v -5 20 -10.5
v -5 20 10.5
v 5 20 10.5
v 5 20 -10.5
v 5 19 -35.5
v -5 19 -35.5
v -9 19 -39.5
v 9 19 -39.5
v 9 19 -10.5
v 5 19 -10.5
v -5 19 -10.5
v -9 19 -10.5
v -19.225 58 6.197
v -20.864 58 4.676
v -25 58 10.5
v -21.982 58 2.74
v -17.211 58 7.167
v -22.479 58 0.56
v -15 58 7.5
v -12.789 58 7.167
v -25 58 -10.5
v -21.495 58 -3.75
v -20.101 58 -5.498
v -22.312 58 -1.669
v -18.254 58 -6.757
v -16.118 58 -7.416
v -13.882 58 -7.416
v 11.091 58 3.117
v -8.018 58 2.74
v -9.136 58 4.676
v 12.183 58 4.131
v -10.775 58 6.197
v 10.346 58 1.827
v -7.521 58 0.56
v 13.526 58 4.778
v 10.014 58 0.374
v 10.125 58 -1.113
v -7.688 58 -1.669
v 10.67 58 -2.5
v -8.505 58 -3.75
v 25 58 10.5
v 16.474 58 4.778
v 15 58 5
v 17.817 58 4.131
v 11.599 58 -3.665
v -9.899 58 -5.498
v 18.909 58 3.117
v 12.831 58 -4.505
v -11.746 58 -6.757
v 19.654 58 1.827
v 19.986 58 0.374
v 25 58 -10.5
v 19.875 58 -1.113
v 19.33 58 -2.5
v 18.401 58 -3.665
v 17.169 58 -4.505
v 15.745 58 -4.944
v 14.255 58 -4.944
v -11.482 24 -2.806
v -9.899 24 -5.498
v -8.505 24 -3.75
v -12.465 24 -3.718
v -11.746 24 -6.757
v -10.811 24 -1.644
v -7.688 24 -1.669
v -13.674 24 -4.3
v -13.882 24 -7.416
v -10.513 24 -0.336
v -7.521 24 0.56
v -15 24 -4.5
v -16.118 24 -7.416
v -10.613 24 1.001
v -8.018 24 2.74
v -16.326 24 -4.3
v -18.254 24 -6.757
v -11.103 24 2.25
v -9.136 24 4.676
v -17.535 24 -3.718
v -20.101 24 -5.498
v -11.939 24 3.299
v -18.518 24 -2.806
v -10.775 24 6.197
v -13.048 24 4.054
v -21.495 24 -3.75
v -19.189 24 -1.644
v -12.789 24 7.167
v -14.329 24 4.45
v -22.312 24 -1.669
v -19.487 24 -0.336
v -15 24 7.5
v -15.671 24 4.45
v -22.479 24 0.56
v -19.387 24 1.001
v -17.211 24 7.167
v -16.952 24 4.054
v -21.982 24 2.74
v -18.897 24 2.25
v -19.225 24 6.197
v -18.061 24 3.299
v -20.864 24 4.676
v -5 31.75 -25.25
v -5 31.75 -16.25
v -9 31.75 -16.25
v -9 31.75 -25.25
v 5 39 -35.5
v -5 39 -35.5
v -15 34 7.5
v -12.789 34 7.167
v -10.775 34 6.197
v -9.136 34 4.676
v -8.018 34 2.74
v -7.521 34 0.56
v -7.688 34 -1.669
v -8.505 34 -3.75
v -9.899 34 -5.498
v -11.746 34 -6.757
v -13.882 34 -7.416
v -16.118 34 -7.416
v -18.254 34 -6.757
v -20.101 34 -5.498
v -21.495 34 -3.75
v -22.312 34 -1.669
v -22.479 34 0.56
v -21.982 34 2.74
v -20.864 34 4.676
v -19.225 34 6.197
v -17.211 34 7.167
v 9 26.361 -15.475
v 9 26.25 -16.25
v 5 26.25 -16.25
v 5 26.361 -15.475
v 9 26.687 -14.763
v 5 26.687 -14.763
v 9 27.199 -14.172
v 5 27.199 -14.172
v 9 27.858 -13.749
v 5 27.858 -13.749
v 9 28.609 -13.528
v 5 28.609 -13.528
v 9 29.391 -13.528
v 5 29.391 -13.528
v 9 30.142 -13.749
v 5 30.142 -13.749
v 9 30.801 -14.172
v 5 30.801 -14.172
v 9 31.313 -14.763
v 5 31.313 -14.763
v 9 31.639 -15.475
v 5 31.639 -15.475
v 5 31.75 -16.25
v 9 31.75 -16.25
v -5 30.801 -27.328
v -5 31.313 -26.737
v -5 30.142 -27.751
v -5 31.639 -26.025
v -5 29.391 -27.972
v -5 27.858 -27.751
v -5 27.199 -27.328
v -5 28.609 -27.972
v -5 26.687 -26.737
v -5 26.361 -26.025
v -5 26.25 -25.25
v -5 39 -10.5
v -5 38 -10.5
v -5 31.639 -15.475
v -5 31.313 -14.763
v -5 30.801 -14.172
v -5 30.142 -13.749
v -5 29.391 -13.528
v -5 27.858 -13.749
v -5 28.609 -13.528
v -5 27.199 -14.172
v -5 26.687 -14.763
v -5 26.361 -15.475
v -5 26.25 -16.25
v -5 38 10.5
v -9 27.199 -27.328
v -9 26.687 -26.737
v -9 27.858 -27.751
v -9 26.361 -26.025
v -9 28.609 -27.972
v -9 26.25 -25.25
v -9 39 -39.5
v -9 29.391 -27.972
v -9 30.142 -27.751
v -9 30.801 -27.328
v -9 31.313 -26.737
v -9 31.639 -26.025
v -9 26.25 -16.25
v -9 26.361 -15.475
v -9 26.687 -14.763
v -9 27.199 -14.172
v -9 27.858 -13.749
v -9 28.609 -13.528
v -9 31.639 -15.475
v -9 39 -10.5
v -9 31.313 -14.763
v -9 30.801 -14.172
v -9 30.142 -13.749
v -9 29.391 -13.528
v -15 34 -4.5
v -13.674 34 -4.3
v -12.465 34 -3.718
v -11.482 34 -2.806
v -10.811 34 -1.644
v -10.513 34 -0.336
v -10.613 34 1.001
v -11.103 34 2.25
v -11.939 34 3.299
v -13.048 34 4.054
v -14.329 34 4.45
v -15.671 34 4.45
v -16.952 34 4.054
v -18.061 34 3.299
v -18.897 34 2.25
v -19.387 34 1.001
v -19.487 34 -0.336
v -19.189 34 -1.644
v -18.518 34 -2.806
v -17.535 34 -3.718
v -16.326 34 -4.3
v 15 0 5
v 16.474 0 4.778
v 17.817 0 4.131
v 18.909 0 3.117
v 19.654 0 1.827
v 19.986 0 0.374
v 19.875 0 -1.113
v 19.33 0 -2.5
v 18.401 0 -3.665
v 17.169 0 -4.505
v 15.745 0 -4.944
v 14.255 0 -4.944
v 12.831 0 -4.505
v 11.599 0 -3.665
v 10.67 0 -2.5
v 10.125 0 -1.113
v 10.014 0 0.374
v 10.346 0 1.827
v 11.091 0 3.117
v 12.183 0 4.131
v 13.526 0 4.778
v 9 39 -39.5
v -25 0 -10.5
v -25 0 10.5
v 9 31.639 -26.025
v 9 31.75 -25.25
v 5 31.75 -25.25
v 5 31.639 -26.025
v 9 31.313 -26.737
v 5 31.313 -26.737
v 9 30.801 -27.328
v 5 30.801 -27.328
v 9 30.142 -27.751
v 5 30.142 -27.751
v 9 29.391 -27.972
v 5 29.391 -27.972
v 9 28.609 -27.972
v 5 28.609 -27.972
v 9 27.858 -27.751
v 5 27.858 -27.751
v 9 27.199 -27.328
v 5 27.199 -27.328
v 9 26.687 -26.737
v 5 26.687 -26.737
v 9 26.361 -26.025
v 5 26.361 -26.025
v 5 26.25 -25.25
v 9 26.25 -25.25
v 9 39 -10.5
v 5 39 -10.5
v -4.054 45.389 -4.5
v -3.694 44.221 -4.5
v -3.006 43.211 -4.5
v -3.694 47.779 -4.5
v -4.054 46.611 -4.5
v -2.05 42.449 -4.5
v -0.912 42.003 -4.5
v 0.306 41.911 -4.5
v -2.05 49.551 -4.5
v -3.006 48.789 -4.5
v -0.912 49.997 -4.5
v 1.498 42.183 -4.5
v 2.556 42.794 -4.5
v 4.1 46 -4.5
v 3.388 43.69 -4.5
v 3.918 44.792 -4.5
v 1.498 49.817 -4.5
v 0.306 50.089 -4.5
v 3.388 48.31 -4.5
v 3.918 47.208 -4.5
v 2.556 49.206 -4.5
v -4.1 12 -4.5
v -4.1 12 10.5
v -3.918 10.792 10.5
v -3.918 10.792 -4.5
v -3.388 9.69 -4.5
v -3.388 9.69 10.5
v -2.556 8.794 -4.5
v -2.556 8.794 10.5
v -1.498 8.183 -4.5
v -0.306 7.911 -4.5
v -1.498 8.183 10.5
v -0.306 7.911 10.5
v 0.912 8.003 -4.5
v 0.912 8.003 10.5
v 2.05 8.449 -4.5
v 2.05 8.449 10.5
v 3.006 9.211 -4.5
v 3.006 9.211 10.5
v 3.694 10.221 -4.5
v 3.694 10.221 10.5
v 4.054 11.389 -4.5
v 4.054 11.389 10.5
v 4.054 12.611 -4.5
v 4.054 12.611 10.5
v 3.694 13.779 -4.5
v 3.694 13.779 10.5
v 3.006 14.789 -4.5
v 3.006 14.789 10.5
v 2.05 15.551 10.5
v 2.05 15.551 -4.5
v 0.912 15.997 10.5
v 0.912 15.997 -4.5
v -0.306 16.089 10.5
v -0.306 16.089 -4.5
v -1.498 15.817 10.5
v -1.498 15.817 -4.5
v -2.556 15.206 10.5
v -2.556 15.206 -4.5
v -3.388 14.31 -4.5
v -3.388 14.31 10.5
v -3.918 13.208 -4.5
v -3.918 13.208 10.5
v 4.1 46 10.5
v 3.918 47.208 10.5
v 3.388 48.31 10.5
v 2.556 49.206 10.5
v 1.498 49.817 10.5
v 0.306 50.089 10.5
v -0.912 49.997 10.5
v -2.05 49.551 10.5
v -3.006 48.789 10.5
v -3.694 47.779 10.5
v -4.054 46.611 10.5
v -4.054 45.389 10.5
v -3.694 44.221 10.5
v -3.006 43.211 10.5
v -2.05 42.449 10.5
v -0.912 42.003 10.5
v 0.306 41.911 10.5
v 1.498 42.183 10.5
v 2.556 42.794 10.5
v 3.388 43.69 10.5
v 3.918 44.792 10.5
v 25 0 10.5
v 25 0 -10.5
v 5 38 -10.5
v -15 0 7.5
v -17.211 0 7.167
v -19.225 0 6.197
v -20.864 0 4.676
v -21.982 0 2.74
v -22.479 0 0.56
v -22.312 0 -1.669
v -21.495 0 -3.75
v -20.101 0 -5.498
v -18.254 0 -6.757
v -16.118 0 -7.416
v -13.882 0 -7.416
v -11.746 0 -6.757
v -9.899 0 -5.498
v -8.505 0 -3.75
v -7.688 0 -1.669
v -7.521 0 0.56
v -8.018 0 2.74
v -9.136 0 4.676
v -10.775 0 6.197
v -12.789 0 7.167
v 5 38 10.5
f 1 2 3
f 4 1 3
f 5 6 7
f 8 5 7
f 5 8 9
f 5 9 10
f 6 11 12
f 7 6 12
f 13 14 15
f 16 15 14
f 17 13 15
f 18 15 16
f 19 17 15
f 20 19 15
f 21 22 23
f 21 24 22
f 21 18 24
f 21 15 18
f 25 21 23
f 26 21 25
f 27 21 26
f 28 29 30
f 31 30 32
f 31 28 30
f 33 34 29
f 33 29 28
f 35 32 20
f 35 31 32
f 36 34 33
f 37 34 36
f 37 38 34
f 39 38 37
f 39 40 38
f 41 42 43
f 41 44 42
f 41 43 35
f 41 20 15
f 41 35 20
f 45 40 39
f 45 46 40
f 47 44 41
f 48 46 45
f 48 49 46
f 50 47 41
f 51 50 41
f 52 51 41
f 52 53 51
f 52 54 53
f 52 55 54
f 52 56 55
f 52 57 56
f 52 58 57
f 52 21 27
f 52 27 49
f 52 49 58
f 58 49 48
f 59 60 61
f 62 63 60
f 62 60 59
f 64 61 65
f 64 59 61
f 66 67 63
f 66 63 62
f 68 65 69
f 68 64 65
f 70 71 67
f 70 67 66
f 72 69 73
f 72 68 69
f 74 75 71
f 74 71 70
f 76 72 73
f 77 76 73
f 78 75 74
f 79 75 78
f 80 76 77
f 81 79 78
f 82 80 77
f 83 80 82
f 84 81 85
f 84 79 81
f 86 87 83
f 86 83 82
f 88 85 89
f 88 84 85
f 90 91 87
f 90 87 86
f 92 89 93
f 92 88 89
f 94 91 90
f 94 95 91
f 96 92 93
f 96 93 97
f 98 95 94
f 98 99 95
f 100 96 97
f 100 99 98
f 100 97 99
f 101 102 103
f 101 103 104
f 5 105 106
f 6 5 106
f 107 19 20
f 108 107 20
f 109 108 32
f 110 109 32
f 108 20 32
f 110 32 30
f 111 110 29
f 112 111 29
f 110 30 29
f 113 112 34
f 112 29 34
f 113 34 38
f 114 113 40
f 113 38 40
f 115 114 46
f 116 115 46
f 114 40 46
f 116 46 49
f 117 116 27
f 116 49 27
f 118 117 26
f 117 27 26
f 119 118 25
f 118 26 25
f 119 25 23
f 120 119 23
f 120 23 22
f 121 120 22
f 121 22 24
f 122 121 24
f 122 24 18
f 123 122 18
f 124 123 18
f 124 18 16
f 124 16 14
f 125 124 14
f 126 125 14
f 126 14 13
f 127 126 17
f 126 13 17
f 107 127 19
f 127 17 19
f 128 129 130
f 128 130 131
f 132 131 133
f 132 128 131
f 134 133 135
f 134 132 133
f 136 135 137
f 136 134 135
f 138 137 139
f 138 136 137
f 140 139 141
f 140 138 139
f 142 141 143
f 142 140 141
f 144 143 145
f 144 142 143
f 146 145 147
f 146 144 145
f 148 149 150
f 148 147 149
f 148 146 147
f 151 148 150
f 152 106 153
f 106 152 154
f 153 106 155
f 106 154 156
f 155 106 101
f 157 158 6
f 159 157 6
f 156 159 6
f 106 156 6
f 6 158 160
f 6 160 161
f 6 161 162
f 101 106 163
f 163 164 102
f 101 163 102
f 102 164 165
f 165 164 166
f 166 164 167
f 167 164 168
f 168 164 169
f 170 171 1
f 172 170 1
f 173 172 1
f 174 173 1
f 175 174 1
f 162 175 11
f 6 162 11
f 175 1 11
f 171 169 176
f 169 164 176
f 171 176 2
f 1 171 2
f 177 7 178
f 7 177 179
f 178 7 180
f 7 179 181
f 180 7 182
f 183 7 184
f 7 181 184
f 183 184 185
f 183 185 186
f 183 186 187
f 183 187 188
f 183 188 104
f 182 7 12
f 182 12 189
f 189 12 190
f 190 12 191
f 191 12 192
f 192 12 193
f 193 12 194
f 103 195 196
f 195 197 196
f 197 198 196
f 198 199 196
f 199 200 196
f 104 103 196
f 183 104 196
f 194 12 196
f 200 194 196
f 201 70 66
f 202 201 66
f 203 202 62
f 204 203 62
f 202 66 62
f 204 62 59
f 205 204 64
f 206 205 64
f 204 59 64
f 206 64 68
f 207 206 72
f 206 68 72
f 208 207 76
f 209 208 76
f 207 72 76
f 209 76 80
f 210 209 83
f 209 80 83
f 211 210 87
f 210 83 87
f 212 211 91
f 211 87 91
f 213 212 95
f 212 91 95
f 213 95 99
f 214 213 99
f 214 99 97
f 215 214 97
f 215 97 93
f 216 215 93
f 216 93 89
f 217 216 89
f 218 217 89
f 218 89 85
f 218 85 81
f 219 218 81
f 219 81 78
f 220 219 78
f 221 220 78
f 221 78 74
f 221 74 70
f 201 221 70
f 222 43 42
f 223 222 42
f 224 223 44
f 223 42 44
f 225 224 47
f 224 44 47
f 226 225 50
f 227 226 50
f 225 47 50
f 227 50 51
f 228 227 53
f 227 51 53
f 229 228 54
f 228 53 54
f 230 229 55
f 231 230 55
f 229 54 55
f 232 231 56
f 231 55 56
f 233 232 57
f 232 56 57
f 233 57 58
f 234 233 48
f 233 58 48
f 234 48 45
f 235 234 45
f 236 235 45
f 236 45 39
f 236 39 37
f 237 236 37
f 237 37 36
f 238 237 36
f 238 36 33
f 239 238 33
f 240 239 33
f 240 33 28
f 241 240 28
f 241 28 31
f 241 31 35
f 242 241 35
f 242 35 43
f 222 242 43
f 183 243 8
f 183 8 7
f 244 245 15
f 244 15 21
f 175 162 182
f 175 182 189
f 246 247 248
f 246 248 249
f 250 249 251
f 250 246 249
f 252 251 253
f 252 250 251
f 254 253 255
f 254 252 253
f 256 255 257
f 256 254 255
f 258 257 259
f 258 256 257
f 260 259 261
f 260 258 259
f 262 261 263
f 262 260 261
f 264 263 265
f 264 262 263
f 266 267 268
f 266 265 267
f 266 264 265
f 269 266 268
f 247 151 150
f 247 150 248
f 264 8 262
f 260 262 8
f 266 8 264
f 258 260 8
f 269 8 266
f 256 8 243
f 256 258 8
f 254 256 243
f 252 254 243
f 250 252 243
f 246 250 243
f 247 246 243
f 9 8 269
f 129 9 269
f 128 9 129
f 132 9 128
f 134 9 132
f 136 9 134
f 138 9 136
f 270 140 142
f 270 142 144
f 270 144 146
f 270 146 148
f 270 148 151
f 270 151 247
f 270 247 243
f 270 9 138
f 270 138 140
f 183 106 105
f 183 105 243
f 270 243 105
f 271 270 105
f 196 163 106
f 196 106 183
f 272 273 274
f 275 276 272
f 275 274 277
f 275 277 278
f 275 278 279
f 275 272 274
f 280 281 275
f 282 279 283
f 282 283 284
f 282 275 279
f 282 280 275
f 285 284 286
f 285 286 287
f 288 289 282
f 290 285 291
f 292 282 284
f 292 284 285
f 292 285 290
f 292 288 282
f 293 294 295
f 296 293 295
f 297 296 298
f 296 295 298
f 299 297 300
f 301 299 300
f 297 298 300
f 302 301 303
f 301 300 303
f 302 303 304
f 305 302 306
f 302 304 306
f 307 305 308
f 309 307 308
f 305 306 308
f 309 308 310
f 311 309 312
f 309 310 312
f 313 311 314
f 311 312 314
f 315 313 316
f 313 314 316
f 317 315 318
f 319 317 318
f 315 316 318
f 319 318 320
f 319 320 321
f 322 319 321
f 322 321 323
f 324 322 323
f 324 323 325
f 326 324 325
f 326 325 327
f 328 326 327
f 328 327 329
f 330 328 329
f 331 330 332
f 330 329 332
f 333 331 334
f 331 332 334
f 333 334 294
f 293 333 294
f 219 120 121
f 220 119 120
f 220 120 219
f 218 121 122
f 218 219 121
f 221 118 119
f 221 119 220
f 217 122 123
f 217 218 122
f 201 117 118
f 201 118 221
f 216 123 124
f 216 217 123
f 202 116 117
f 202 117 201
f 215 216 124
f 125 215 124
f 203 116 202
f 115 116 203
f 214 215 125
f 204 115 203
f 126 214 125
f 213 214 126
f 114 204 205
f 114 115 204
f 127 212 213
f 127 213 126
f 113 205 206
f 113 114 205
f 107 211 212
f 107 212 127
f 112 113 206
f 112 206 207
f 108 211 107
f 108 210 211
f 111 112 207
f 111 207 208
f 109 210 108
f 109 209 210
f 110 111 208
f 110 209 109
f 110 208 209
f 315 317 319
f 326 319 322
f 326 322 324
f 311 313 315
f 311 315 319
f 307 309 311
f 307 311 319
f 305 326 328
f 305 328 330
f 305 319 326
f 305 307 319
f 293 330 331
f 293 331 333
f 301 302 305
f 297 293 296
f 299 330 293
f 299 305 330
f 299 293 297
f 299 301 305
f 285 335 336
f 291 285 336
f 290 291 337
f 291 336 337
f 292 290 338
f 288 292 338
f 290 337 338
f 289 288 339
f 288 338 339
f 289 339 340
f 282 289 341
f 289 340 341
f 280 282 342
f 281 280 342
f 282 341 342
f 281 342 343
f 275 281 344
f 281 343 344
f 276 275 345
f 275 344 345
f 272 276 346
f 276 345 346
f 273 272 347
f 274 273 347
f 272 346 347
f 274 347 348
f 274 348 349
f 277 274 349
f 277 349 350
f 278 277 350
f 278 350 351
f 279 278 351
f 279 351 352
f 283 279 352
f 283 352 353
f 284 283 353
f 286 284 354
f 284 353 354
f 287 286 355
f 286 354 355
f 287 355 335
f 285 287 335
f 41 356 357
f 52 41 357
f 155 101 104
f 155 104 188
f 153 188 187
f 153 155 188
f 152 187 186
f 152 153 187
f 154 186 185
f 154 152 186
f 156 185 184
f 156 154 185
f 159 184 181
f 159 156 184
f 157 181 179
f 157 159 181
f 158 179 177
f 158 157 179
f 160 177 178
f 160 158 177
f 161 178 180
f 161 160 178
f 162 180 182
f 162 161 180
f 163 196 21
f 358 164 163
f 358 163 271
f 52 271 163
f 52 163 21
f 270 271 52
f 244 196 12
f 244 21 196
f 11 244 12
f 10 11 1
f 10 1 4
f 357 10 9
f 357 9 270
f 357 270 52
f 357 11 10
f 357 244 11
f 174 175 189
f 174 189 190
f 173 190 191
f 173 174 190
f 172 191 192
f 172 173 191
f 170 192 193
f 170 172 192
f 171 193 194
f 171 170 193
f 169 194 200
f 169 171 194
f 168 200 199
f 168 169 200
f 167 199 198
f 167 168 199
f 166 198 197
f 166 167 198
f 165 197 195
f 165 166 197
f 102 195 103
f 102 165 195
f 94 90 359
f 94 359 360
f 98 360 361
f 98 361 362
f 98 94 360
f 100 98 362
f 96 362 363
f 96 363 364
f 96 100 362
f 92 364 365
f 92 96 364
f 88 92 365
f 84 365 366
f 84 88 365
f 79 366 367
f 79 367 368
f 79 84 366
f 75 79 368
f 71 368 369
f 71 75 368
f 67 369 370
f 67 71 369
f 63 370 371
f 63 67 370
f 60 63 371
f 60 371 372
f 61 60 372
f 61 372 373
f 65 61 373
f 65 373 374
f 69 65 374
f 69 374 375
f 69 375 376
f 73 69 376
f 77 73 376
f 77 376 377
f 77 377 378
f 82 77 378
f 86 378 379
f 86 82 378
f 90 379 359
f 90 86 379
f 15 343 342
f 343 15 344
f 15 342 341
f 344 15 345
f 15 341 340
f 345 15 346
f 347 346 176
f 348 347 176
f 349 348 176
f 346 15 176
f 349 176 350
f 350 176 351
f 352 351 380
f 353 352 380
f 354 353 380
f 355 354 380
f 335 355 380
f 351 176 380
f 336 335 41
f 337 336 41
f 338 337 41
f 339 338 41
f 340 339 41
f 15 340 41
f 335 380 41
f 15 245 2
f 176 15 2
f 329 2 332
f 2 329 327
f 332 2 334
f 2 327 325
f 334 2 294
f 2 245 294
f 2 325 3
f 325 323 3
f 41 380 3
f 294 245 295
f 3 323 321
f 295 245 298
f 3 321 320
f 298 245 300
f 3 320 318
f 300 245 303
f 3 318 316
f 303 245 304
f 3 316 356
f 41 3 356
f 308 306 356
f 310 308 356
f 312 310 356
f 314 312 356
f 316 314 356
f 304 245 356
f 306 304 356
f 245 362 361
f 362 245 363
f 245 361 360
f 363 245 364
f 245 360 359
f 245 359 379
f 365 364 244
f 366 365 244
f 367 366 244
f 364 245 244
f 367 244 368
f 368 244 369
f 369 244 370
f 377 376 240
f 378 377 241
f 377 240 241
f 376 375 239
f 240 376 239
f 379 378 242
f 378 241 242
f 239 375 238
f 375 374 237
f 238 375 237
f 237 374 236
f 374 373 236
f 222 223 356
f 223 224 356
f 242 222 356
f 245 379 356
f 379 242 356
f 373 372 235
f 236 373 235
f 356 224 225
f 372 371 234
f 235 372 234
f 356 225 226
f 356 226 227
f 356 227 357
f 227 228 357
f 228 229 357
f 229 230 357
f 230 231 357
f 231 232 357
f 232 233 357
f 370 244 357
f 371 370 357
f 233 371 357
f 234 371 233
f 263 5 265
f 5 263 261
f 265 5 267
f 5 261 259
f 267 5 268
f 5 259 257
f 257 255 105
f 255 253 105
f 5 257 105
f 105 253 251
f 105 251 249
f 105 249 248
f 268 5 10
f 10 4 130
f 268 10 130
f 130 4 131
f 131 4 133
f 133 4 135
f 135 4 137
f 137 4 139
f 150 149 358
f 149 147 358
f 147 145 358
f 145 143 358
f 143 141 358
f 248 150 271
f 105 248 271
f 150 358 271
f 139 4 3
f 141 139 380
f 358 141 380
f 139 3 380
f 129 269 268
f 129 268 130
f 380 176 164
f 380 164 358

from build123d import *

# Parameters (mm, degrees)
SKETCH1_W           = 50
SKETCH1_H           = 21
BOSS_EXTRUDE1_DEPTH = 58
SKETCH3_R           = 7.5
CUT_EXTRUDE1_DEPTH  = 24
CUT_EXTRUDE2_REACH  = 66.025
SKETCH4_R           = 5
CUT_EXTRUDE3_START  = -24
SKETCH5_R           = 7.5
CUT_EXTRUDE3_DEPTH  = 24
CUT_EXTRUDE4_REACH  = 66.025
SKETCH6_R           = 4.5
CUT_EXTRUDE5_REACH  = 68.558
SKETCH8_W           = 10
SKETCH8_H           = 18
SKETCH7_R           = 4.1
CUT_EXTRUDE6_DEPTH  = 15
BOSS_EXTRUDE2_DEPTH = 25
SKETCH12_W          = 18
SKETCH12_H          = 20
BOSS_EXTRUDE3_DEPTH = 4
CUT_EXTRUDE7_DEPTH  = 78.975957833


with BuildPart() as part:
    # Sketch1 → Boss-Extrude1 (new body)
    with BuildSketch(Plane(origin=(0, 0, 0), x_dir=(1, 0, 0), z_dir=(0, 1, 0))):
        Rectangle(SKETCH1_W, SKETCH1_H)
    extrude(amount=BOSS_EXTRUDE1_DEPTH)

    # Sketch3 → Cut-Extrude1 (cut)
    with BuildSketch(Plane(origin=(0, 58, 0), x_dir=(1, 0, 0), z_dir=(0, 1, 0))):
        with Locations(Location((-15, 0, 0), (0, 0, 270))):
            Circle(SKETCH3_R)
    extrude(amount=-CUT_EXTRUDE1_DEPTH, mode=Mode.SUBTRACT)

    # Sketch4 → Cut-Extrude2 (cut, up to next)
    with BuildSketch(Plane(origin=(0, 58, 0), x_dir=(1, 0, 0), z_dir=(0, 1, 0)), mode=Mode.PRIVATE) as cut_extrude2_sk1:
        with Locations(Location((15, 0, 0), (0, 0, 270))):
            Circle(SKETCH4_R)
    cut_extrude2_tool1 = extrude(cut_extrude2_sk1.sketch, amount=-CUT_EXTRUDE2_REACH, mode=Mode.PRIVATE) & part.part
    add(cut_extrude2_tool1.solids().sort_by_distance((15, 58, 0))[0], mode=Mode.SUBTRACT)

    # Sketch5 → Cut-Extrude3 (cut)
    with BuildSketch(Plane.XZ.offset(CUT_EXTRUDE3_START)):
        with Locations(Location((-15, 0, 0), (0, 0, 90))):
            Circle(SKETCH5_R)
    extrude(amount=CUT_EXTRUDE3_DEPTH, mode=Mode.SUBTRACT)

    # Sketch6 → Cut-Extrude4 (cut, up to next)
    with BuildSketch(Plane.XZ, mode=Mode.PRIVATE) as cut_extrude4_sk1:
        with Locations(Location((-15, 0, 0), (0, 0, 270))):
            Circle(SKETCH6_R)
    cut_extrude4_tool1 = extrude(cut_extrude4_sk1.sketch, amount=-CUT_EXTRUDE4_REACH, mode=Mode.PRIVATE) & part.part
    add(cut_extrude4_tool1.solids().sort_by_distance((-15, 0, 0))[0], mode=Mode.SUBTRACT)

    # Sketch8 → Cut-Extrude5 (cut, up to next)
    with BuildSketch(Plane.XY.offset(10.5), mode=Mode.PRIVATE) as cut_extrude5_sk1:
        with Locations((0, 29)):
            Rectangle(SKETCH8_W, SKETCH8_H)
    cut_extrude5_tool1 = extrude(cut_extrude5_sk1.sketch, amount=-CUT_EXTRUDE5_REACH, mode=Mode.PRIVATE) & part.part
    add(cut_extrude5_tool1.solids().sort_by_distance((0, 29, 10.5))[0], mode=Mode.SUBTRACT)

    # Sketch7 → Cut-Extrude6 (cut)
    with BuildSketch(Plane.XY.offset(10.5)):
        with Locations((0, 46)):
            Circle(SKETCH7_R)
        with Locations(Location((0, 12, 0), (0, 0, 180))):
            Circle(SKETCH7_R)
    extrude(amount=-CUT_EXTRUDE6_DEPTH, mode=Mode.SUBTRACT)

    # Sketch11 → Boss-Extrude2 (add)
    with BuildSketch(Plane(origin=(0, 0, -10.5), x_dir=(-1, 0, 0), z_dir=(0, 0, -1))):
        Polygon((9, 19), (9, 39), (5, 39), (5, 38), (5, 20), (5, 19), align=None)
        Polygon((-9, 39), (-9, 19), (-5, 19), (-5, 20), (-5, 38), (-5, 39), align=None)
    extrude(amount=BOSS_EXTRUDE2_DEPTH)

    # Sketch12 → Boss-Extrude3 (add)
    with BuildSketch(Plane(origin=(0, 0, -35.5), x_dir=(-1, 0, 0), z_dir=(0, 0, -1))):
        with Locations((0, 29)):
            Rectangle(SKETCH12_W, SKETCH12_H)
    extrude(amount=BOSS_EXTRUDE3_DEPTH)

    # Sketch13 → Cut-Extrude7 (cut, through all)
    with BuildSketch(Plane(origin=(9, 0, 0), x_dir=(0, 0, -1), z_dir=(1, 0, 0))):
        with BuildLine():
            Line((16.25, 31.75), (25.25, 31.75))
            ThreePointArc((25.25, 31.75), (28, 29), (25.25, 26.25))
            Line((25.25, 26.25), (16.25, 26.25))
            ThreePointArc((16.25, 26.25), (13.5, 29), (16.25, 31.75))
        make_face()
    extrude(amount=-CUT_EXTRUDE7_DEPTH, mode=Mode.SUBTRACT)


solid = part.part
